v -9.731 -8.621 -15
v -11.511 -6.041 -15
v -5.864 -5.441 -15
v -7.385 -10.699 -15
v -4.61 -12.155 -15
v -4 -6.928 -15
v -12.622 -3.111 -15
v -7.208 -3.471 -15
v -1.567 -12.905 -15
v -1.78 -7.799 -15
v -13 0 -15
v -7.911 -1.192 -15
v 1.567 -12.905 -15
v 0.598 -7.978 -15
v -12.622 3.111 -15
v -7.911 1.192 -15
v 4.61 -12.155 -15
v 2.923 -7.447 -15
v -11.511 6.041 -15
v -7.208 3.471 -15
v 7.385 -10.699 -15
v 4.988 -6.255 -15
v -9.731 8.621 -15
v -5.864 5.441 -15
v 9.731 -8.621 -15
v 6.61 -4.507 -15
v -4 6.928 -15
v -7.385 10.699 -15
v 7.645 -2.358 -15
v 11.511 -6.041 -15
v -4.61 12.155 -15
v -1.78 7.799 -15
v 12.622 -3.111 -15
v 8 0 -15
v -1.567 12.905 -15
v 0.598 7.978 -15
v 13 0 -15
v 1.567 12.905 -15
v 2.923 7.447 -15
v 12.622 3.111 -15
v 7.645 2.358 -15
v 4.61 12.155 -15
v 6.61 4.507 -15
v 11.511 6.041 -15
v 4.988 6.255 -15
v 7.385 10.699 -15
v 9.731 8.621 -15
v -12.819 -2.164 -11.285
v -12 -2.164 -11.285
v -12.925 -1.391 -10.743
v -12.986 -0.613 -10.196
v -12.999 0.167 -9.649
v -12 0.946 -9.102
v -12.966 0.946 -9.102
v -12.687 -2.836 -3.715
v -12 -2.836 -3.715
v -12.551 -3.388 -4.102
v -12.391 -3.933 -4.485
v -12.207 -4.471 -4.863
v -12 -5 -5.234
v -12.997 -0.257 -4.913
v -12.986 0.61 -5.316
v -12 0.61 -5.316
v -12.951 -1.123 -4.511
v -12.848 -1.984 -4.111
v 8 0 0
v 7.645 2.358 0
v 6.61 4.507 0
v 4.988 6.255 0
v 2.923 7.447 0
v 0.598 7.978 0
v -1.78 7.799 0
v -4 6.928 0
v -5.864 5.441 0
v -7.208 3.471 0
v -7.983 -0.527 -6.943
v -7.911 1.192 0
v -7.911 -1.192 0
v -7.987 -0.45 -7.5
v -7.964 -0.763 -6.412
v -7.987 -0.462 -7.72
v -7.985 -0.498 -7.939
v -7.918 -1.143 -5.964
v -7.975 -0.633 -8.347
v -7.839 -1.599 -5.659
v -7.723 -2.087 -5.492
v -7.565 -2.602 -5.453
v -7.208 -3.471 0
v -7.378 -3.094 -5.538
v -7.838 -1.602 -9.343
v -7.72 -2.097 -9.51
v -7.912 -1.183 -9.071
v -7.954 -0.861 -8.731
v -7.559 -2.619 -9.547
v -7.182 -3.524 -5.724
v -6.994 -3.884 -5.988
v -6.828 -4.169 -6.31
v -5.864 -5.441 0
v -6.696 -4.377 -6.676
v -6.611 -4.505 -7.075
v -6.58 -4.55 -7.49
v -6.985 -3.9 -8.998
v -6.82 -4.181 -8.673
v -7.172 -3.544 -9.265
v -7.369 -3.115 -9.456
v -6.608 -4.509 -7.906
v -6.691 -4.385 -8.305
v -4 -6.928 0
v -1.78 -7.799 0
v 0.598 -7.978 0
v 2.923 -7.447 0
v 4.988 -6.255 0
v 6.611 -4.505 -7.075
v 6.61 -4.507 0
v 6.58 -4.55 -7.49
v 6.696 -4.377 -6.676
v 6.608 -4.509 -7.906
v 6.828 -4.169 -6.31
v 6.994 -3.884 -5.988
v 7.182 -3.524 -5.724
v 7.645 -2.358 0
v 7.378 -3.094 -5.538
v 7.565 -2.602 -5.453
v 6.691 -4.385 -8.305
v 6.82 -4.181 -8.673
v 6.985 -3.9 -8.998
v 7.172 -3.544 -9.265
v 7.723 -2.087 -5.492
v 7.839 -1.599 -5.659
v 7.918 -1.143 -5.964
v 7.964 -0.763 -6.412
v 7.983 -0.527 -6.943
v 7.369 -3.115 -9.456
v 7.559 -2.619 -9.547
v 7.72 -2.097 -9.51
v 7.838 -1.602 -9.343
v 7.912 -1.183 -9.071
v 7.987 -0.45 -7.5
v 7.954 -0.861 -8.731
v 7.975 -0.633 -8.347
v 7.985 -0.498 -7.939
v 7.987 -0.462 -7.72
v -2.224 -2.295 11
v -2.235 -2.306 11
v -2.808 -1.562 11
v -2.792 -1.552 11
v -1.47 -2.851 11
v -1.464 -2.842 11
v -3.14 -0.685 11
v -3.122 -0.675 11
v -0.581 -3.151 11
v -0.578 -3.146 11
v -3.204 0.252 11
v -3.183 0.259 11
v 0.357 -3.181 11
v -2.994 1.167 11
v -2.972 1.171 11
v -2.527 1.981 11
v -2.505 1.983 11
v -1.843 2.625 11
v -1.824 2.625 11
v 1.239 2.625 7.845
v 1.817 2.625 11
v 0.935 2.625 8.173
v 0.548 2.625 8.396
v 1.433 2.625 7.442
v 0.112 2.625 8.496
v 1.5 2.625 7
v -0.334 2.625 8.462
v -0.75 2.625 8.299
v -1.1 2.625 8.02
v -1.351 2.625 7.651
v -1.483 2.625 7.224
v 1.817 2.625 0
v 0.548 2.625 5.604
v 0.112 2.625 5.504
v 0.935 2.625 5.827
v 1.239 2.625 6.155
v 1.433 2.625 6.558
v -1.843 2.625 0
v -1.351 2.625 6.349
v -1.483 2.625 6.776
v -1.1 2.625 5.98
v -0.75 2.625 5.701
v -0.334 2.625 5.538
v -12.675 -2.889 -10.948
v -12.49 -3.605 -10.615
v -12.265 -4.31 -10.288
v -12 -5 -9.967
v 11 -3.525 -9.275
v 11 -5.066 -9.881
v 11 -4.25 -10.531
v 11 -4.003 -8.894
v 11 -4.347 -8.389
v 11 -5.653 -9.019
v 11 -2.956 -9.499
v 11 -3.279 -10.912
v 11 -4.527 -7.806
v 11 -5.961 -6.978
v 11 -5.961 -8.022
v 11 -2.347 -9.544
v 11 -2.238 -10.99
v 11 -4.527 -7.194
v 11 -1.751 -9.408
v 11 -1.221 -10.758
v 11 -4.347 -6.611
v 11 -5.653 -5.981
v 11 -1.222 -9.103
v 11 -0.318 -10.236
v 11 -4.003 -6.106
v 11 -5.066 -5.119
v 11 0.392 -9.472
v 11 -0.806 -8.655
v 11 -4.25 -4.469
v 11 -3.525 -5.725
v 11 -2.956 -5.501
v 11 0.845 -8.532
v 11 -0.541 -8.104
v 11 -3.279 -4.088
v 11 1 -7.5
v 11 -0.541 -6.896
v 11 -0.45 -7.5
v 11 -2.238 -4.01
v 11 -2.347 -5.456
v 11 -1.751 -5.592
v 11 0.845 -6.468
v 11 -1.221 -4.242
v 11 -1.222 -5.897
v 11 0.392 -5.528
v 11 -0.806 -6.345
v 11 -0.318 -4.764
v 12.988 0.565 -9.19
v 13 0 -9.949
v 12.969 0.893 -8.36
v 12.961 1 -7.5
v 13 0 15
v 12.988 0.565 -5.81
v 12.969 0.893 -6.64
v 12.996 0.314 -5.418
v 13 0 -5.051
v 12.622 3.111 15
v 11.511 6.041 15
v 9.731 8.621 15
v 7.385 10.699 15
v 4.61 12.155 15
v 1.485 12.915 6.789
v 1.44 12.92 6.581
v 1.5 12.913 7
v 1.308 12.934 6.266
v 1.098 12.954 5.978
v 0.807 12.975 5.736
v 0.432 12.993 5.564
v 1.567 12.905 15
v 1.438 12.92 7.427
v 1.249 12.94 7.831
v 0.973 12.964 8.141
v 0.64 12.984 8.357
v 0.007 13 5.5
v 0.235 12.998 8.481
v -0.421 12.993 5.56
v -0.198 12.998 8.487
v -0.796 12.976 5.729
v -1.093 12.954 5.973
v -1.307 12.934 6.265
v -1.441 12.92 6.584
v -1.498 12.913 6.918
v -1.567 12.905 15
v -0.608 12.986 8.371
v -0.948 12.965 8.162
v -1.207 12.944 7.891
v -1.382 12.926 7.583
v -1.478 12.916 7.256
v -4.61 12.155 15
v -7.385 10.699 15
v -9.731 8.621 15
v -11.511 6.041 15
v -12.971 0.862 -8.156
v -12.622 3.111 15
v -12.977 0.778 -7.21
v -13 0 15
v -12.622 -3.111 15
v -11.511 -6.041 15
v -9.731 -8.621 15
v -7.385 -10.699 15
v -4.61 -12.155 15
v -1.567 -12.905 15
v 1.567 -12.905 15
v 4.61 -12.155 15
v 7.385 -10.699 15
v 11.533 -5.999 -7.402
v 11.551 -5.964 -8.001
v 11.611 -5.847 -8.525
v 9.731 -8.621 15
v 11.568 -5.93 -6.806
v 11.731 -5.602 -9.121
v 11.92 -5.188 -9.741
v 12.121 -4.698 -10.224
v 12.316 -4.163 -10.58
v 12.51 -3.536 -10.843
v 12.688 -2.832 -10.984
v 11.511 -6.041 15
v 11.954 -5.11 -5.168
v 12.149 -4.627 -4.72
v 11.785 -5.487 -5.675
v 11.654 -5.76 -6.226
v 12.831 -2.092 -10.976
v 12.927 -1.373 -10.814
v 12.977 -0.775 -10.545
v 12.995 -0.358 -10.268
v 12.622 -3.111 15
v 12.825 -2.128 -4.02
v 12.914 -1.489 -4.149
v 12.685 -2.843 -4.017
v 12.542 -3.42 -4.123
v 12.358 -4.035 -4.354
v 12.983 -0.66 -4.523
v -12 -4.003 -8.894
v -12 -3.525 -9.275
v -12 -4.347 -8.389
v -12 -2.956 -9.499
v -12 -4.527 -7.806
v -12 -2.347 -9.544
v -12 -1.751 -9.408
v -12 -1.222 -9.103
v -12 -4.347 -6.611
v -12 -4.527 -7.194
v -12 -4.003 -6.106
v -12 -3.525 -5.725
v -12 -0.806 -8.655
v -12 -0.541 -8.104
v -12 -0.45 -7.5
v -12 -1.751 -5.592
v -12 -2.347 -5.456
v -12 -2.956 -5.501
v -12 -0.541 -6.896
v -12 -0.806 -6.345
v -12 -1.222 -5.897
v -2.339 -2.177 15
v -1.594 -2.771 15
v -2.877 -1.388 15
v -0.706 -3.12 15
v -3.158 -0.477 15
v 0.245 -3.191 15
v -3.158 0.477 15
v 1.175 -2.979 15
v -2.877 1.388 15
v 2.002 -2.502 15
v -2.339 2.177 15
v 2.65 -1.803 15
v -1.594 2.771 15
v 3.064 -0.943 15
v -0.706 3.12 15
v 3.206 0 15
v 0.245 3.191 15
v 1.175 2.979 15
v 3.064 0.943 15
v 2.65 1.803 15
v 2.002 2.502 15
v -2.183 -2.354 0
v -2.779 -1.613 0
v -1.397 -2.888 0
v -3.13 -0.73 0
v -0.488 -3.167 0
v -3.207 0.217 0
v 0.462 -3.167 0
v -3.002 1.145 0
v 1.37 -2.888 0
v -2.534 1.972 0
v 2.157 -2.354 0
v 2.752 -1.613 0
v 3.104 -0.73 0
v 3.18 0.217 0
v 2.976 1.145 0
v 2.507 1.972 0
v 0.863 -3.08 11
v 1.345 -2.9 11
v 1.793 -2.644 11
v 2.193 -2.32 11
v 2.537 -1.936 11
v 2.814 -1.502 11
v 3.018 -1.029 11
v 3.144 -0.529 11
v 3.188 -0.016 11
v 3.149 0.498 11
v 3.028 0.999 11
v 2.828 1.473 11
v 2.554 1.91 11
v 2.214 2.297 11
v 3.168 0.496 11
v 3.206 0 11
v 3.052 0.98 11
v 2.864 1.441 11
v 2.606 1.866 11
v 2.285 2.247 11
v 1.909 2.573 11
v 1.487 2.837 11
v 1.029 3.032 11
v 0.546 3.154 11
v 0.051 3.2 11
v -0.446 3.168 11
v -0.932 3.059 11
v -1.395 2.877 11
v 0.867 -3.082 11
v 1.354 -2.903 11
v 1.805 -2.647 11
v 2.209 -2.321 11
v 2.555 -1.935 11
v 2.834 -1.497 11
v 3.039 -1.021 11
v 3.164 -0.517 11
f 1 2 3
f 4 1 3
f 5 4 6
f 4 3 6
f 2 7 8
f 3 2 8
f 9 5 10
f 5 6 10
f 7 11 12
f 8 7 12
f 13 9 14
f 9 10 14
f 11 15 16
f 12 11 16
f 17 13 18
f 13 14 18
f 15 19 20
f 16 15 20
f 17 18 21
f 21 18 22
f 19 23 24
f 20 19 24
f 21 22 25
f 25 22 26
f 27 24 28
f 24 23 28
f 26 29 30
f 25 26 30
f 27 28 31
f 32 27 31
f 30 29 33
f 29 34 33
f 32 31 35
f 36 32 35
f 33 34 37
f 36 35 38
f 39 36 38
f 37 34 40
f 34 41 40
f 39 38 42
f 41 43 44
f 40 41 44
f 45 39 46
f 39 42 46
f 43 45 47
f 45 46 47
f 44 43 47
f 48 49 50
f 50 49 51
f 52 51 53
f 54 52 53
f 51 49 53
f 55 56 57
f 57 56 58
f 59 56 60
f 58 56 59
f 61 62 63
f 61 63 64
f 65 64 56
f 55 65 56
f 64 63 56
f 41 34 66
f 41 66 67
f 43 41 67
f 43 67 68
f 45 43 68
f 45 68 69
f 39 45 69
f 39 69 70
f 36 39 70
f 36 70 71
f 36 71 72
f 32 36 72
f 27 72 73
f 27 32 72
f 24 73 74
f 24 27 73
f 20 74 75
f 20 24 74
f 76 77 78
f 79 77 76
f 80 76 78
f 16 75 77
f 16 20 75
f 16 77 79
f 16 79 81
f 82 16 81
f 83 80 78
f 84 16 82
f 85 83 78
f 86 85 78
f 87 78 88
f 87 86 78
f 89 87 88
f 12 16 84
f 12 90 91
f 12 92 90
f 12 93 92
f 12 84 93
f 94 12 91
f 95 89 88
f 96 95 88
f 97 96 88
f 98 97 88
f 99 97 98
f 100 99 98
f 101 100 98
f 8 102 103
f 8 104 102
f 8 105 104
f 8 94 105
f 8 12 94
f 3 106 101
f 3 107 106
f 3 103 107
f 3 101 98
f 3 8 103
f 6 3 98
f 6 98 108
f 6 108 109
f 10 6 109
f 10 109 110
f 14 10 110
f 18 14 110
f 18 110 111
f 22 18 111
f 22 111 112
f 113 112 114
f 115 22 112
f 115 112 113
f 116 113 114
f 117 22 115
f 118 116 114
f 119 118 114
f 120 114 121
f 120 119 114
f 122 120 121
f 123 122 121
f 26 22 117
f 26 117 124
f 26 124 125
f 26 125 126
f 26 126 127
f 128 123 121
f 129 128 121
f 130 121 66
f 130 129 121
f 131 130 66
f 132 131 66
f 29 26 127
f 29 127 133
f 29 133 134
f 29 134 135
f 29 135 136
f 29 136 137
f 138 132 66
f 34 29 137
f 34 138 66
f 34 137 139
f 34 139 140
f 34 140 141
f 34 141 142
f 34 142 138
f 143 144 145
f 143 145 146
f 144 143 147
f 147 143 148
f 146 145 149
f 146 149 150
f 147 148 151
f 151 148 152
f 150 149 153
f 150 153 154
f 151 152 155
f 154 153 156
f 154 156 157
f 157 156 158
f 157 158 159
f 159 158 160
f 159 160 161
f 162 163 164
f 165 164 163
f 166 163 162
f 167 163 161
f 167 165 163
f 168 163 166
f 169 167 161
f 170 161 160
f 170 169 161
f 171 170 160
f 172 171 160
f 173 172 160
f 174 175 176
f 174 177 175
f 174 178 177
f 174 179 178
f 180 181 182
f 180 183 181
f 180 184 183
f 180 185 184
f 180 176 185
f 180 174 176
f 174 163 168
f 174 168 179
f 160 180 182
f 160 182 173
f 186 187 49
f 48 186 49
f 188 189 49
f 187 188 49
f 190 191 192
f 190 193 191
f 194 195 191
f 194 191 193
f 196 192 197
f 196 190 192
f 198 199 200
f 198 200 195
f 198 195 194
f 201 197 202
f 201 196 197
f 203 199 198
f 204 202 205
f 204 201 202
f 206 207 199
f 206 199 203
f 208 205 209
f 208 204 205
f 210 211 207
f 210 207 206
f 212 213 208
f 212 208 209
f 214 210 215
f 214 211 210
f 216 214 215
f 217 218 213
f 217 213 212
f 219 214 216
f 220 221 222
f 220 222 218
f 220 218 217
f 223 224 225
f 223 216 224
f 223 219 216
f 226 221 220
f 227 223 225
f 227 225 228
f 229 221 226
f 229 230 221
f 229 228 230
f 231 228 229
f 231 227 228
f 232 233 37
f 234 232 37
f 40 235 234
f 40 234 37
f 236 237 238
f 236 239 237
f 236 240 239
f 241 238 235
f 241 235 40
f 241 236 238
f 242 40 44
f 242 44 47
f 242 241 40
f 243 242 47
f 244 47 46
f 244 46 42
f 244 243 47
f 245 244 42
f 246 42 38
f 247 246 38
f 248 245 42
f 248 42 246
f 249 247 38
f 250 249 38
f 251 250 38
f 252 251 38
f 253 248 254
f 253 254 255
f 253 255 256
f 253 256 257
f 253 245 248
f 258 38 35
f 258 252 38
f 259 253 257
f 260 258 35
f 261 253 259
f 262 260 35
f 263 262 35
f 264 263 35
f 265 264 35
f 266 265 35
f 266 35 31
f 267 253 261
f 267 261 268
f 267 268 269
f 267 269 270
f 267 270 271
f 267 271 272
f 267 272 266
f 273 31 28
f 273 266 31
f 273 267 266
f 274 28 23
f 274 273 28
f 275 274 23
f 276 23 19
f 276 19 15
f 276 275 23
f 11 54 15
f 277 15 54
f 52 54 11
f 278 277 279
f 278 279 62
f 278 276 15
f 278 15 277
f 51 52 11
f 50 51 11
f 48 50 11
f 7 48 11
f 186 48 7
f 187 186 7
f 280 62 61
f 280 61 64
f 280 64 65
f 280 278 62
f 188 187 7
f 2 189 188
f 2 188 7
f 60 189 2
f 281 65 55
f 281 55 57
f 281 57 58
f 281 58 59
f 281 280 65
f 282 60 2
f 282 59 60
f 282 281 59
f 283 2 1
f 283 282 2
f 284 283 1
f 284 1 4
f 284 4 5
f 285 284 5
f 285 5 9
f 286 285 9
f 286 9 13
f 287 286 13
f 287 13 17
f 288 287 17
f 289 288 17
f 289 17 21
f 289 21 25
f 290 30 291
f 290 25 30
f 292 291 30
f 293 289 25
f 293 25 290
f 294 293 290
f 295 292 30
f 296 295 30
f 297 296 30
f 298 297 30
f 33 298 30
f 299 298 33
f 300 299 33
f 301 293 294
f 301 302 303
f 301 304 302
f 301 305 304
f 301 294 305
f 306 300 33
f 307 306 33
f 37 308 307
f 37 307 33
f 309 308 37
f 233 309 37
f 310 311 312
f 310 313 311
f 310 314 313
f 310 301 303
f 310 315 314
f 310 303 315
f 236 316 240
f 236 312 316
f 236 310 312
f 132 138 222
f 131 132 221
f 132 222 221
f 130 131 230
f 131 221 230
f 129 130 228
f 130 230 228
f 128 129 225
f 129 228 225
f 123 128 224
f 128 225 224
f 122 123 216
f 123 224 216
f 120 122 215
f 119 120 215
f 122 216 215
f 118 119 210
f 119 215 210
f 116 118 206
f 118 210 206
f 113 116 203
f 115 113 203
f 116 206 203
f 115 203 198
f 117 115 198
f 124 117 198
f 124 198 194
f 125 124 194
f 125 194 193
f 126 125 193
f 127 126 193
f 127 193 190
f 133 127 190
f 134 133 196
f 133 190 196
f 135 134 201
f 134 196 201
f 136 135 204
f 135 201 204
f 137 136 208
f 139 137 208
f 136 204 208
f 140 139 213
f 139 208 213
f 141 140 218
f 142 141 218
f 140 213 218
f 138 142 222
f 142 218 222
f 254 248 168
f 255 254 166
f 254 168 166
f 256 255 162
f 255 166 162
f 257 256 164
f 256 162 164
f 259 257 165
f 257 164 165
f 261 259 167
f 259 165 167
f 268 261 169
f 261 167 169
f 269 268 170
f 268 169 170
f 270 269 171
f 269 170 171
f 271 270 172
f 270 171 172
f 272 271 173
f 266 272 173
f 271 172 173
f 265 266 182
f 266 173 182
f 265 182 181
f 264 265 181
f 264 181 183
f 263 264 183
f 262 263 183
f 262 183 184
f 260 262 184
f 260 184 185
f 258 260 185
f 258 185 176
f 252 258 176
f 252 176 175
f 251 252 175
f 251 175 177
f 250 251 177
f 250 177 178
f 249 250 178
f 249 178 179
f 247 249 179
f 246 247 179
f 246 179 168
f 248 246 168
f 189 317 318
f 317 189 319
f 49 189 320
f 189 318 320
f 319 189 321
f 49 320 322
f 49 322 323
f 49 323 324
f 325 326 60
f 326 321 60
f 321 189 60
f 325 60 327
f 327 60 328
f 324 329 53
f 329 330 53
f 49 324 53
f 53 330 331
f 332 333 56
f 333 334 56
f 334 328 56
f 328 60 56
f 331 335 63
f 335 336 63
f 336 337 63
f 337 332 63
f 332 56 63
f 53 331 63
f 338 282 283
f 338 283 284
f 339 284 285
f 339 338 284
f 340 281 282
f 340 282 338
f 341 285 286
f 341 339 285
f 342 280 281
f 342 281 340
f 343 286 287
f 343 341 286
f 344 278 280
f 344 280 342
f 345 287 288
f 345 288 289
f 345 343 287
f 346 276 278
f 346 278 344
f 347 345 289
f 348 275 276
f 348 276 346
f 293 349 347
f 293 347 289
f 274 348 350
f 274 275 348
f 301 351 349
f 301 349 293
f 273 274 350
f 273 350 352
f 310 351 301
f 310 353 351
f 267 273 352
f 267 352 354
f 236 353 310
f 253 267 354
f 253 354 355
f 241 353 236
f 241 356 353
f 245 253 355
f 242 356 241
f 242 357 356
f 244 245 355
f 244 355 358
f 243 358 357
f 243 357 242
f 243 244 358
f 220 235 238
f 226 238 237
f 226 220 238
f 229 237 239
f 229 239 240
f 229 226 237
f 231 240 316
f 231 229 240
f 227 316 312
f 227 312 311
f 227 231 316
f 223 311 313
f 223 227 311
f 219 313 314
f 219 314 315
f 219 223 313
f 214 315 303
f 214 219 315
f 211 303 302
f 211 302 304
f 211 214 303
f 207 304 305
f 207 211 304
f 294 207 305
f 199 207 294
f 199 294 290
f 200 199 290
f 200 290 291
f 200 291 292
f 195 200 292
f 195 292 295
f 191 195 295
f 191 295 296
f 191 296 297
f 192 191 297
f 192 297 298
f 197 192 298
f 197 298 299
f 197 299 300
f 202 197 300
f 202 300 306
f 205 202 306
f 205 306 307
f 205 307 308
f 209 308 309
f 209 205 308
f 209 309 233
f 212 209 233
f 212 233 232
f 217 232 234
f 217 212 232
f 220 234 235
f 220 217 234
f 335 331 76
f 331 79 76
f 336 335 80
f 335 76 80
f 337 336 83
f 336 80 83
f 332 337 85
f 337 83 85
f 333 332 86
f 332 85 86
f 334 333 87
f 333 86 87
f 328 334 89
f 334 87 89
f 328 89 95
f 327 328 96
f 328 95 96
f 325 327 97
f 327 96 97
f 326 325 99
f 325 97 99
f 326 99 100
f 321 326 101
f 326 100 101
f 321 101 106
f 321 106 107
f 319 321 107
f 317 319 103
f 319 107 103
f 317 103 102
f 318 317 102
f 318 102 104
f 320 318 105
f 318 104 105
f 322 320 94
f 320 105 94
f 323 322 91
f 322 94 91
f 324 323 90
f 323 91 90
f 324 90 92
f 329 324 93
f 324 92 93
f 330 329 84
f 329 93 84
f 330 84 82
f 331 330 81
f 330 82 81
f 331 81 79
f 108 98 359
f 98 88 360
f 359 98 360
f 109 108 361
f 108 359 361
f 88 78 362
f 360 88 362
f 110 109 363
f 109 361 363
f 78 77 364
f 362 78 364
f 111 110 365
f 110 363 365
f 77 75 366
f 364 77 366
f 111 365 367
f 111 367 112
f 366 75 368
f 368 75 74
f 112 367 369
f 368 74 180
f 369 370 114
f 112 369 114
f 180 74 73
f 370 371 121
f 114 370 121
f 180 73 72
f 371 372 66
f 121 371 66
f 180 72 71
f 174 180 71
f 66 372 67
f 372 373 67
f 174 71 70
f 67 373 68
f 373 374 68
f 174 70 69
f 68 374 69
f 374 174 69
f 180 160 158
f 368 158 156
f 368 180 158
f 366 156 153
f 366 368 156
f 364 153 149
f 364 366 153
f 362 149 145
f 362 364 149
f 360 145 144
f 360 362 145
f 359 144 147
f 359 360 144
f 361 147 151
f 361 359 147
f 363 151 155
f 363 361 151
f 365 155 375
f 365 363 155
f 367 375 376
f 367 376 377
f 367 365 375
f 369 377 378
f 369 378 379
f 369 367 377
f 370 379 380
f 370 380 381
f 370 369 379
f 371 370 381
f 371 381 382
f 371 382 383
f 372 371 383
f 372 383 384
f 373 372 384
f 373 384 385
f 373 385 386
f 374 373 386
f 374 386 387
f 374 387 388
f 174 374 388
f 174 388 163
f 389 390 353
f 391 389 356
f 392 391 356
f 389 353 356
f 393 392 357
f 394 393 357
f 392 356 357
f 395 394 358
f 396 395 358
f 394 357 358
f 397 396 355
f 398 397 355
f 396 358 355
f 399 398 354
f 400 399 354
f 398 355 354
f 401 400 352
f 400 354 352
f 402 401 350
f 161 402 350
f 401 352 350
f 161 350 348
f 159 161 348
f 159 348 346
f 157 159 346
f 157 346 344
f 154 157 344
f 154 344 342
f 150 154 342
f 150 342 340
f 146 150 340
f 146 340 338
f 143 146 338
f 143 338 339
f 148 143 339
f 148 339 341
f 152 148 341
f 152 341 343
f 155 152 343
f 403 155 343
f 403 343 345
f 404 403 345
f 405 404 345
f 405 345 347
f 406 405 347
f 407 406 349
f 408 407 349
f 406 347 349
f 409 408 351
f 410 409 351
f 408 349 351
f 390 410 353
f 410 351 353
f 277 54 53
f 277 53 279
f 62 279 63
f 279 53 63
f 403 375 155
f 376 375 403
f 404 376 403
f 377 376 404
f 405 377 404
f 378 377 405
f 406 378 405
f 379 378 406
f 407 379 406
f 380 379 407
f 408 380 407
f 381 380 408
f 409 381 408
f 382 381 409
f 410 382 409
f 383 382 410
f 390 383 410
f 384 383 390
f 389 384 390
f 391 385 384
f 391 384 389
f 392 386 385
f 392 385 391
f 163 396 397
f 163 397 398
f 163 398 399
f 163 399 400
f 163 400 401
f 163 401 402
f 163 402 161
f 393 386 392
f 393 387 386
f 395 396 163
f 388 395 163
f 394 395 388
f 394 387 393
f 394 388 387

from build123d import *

# Parameters (mm, degrees)
F0_R      = 13
F5_DEPTH  = 15
F4_R      = 8
F6_DEPTH  = 15
F3_R      = 3.2
F8_DEPTH  = 4
F9_DEPTH  = 11
F10_R     = 2.05
F11_DEPTH = 15
F12_R     = 1.5
F13_DEPTH = 25
F15_R     = 3.5
F16_DEPTH = 5
F19_DEPTH = 3


with BuildPart() as f5:
    # F0 (on Top) → F5 (new body, symmetric)
    with BuildSketch(Plane.XY):
        Circle(F0_R)
    extrude(amount=F5_DEPTH, both=True)

    # F4 (on offset) → F6 (cut)
    with BuildSketch(Plane.XY.offset(-15)):
        Circle(F4_R)
    extrude(amount=F6_DEPTH, mode=Mode.SUBTRACT)

    # F3 (on offset) → F8 (cut)
    with BuildSketch(Plane.XY.offset(15)):
        with Locations((0.0063437128, 0)):
            Circle(F3_R)
    extrude(amount=-F8_DEPTH, mode=Mode.SUBTRACT)

    # F7 (on Top) → F9 (cut)
    with BuildSketch(Plane.XY):
        with BuildLine():
            Line((1.8168599408, 2.625), (-1.8433996128, 2.625))
            ThreePointArc((-1.8433996128, 2.625), (-0.013269836, -3.2022189551), (1.8168599408, 2.625))
        make_face()
    extrude(amount=F9_DEPTH, mode=Mode.SUBTRACT)

    # F10 (on Right) → F11 (cut, symmetric)
    with BuildSketch(Plane.YZ):
        with Locations((-2.5, -7.5)):
            Circle(F10_R)
    extrude(amount=F11_DEPTH, both=True, mode=Mode.SUBTRACT)

    # F12 (on Front) → F13 (cut)
    with BuildSketch(Plane.XZ):
        with Locations((0, 7)):
            Circle(F12_R)
    extrude(amount=-F13_DEPTH, mode=Mode.SUBTRACT)

    # F15 (on offset) → F16 (cut)
    with BuildSketch(Plane.YZ.offset(11)):
        with Locations((-2.5, -7.5)):
            Circle(F15_R)
    extrude(amount=F16_DEPTH, mode=Mode.SUBTRACT)

    # F18 (on offset) → F19 (cut)
    with BuildSketch(Plane.YZ.offset(-12)):
        Polygon((-5.9460342998, -5.8984858401), (-5.6099690969, -9.683596166), (-2.1639347971, -11.2851103259), (0.9460342998, -9.1015141599), (0.6099690969, -5.316403834), (-2.8360652029, -3.7148896741), align=None)
    extrude(amount=-F19_DEPTH, mode=Mode.SUBTRACT)


solid = f5.part
